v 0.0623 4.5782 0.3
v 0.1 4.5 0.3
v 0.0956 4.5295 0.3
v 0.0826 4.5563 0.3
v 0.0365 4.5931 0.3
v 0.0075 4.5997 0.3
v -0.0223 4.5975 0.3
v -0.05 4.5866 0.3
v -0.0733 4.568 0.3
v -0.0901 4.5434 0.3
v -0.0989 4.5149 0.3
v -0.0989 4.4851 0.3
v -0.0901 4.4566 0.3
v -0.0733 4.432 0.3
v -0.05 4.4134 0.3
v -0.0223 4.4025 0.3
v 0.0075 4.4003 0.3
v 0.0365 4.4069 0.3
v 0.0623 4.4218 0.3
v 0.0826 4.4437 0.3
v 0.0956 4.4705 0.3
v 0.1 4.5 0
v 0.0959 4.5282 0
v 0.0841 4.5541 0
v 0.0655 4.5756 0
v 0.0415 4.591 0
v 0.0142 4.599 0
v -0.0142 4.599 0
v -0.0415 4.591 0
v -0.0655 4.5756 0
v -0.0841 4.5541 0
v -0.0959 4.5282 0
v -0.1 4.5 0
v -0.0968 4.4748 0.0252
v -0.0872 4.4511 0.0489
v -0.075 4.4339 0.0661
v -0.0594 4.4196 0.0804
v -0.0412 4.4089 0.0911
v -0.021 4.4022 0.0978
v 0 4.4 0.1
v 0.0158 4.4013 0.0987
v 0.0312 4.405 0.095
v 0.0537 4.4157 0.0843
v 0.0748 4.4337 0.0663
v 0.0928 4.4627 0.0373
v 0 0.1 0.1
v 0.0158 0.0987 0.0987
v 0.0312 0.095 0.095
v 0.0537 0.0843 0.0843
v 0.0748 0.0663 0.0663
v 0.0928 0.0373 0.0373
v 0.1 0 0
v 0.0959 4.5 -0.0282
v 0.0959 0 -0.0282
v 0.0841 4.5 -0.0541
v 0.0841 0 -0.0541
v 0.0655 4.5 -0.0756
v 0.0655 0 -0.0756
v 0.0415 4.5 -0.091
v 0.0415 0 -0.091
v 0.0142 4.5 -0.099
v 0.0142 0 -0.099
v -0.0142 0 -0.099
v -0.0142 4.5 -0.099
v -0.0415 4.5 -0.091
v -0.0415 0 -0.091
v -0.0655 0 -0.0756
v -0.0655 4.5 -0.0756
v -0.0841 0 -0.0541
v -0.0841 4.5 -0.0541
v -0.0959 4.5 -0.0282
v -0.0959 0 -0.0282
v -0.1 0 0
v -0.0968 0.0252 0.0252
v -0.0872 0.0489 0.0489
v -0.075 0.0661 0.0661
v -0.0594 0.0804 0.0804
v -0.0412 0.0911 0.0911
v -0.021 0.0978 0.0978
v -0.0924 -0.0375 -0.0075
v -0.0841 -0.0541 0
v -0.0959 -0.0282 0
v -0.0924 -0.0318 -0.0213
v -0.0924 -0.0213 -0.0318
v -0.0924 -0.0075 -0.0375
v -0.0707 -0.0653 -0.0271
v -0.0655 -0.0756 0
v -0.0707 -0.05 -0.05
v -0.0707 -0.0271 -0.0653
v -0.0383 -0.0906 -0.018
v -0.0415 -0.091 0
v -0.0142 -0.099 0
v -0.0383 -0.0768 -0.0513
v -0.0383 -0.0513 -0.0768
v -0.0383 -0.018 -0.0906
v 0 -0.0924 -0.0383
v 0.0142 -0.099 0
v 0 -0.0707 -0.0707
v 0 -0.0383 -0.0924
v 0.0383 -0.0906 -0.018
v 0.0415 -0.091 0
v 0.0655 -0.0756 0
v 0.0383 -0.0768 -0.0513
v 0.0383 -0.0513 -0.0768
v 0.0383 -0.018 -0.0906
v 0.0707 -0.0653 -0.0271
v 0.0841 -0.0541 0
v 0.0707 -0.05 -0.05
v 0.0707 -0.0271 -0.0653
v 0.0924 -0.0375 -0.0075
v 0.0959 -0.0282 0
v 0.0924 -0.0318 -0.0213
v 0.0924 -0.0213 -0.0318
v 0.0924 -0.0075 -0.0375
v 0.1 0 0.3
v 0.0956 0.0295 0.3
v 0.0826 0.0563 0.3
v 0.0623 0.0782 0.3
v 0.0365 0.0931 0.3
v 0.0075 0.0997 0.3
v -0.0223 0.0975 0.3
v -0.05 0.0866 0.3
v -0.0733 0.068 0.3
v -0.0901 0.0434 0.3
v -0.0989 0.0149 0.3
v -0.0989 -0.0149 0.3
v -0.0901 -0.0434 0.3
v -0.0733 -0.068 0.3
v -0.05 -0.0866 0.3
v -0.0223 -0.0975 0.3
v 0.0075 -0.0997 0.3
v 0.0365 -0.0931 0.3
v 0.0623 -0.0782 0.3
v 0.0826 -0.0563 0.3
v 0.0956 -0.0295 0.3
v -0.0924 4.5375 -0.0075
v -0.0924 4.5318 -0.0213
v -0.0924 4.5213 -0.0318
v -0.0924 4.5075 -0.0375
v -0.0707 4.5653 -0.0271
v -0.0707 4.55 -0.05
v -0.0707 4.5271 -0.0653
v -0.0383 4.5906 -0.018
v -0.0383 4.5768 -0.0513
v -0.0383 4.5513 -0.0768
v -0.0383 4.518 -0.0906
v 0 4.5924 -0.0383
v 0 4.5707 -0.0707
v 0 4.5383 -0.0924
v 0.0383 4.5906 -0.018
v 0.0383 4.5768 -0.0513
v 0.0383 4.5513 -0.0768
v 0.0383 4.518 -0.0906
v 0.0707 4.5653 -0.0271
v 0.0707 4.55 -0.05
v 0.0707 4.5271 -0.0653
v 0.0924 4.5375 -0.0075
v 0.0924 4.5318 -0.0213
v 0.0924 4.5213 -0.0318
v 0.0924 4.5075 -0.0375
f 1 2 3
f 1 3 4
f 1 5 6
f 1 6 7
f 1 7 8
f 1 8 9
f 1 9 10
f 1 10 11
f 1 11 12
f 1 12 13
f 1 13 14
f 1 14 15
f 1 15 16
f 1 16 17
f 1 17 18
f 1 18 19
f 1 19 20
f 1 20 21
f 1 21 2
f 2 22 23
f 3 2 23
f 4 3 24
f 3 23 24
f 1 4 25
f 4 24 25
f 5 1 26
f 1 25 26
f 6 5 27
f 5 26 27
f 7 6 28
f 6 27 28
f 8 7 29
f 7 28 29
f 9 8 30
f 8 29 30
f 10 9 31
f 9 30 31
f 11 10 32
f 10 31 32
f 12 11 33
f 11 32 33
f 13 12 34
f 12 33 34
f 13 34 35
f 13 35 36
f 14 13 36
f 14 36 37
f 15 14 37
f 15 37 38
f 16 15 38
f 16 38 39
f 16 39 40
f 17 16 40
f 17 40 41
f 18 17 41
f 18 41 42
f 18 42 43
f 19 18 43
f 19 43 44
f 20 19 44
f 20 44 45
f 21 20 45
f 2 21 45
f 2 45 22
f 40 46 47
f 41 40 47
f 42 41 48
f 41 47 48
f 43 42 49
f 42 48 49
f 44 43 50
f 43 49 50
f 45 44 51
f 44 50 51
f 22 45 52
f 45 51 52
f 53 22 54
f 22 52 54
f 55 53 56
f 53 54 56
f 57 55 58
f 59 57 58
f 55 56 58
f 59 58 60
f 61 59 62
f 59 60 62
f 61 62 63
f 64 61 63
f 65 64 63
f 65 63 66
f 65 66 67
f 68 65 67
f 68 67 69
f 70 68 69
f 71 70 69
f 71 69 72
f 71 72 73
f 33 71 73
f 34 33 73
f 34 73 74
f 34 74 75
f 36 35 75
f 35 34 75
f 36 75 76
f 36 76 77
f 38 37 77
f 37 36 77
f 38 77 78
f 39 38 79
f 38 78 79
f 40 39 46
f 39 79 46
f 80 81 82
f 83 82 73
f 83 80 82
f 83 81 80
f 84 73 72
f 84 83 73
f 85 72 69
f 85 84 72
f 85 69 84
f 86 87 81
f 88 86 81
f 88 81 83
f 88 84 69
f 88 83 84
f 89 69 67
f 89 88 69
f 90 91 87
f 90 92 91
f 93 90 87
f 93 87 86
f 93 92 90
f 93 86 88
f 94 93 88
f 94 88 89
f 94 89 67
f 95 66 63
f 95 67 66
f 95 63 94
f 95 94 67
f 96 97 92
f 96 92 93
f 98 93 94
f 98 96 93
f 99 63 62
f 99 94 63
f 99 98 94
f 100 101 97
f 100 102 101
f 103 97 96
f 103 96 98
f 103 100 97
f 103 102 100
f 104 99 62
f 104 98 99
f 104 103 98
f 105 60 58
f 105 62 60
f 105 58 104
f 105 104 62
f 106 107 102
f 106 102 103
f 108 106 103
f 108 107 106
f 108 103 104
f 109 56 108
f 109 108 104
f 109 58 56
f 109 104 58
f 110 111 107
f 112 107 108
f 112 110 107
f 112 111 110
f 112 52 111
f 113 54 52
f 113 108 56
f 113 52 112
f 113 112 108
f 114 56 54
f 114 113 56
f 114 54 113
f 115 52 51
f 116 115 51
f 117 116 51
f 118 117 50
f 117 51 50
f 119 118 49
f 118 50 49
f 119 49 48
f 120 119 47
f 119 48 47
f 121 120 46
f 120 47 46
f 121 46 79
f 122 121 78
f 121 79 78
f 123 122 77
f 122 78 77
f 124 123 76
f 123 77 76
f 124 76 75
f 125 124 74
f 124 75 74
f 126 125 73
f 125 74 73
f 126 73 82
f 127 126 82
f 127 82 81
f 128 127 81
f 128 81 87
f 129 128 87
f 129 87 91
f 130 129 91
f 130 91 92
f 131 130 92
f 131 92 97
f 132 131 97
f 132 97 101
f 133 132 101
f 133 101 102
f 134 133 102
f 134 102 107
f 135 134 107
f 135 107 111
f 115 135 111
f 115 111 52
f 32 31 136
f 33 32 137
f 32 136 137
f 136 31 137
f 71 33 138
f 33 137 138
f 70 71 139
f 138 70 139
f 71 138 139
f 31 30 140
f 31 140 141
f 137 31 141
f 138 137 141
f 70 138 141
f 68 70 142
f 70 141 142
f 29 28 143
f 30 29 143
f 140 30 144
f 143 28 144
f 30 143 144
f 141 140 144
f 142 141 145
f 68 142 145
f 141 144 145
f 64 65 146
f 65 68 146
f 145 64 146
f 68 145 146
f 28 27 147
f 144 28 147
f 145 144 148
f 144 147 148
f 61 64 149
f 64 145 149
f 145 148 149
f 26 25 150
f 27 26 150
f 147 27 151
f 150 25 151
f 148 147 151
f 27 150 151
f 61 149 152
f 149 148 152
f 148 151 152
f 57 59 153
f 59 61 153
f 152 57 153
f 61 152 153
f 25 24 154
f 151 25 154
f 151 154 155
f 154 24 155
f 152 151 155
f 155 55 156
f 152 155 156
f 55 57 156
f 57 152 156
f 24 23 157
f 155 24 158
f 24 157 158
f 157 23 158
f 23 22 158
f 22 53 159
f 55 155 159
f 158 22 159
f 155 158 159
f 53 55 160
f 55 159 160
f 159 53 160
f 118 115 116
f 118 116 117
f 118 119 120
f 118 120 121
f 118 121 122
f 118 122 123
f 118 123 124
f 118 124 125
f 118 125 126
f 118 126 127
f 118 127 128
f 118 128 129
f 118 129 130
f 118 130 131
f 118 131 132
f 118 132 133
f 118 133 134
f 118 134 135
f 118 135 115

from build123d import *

# Parameters (mm, degrees)
SKETCH1_R           = 0.1
BOSS_EXTRUDE1_DEPTH = 4.5
SKETCH2_R           = 0.1
BOSS_EXTRUDE2_DEPTH = 0.3
REVOLVE1_ANGLE      = 90
REVOLVE2_ANGLE      = 90


with BuildPart() as part:
    # Sketch1 → Boss-Extrude1 (new body)
    with BuildSketch(Plane(origin=(0, 0, 0), x_dir=(1, 0, 0), z_dir=(0, 1, 0))):
        with Locations(Location((0, 0, 0), (0, 0, 270))):
            Circle(SKETCH1_R)
    extrude(amount=BOSS_EXTRUDE1_DEPTH)

    # Sketch2 → Boss-Extrude2 (add)
    with BuildSketch(Plane.XY):
        with Locations((0, 4.5)):
            Circle(SKETCH2_R)
        Circle(SKETCH2_R)
    extrude(amount=BOSS_EXTRUDE2_DEPTH)

    # Sketch5 → Revolve1 (revolve)
    with BuildSketch(Plane(origin=(0, 0, 0), x_dir=(-1, 0, 0), z_dir=(0, 0, -1))):
        with BuildLine():
            Line((-0.1, 4.5), (0.1, 4.5))
            ThreePointArc((0.1, 4.5), (0, 4.6), (-0.1, 4.5))
        make_face()
    revolve(axis=Axis((0.1, 4.5, 0), (-1, 0, 0)), revolution_arc=REVOLVE1_ANGLE)

    # Sketch6 → Revolve2 (revolve)
    with BuildSketch(Plane(origin=(0, 0, 0), x_dir=(-1, 0, 0), z_dir=(0, 0, -1))):
        with BuildLine():
            Line((-0.1, 0), (0.1, 0))
            ThreePointArc((0.1, 0), (0, -0.1), (-0.1, 0))
        make_face()
    revolve(axis=Axis((0.1, 0, 0), (1, 0, 0)), revolution_arc=REVOLVE2_ANGLE)


solid = part.part
